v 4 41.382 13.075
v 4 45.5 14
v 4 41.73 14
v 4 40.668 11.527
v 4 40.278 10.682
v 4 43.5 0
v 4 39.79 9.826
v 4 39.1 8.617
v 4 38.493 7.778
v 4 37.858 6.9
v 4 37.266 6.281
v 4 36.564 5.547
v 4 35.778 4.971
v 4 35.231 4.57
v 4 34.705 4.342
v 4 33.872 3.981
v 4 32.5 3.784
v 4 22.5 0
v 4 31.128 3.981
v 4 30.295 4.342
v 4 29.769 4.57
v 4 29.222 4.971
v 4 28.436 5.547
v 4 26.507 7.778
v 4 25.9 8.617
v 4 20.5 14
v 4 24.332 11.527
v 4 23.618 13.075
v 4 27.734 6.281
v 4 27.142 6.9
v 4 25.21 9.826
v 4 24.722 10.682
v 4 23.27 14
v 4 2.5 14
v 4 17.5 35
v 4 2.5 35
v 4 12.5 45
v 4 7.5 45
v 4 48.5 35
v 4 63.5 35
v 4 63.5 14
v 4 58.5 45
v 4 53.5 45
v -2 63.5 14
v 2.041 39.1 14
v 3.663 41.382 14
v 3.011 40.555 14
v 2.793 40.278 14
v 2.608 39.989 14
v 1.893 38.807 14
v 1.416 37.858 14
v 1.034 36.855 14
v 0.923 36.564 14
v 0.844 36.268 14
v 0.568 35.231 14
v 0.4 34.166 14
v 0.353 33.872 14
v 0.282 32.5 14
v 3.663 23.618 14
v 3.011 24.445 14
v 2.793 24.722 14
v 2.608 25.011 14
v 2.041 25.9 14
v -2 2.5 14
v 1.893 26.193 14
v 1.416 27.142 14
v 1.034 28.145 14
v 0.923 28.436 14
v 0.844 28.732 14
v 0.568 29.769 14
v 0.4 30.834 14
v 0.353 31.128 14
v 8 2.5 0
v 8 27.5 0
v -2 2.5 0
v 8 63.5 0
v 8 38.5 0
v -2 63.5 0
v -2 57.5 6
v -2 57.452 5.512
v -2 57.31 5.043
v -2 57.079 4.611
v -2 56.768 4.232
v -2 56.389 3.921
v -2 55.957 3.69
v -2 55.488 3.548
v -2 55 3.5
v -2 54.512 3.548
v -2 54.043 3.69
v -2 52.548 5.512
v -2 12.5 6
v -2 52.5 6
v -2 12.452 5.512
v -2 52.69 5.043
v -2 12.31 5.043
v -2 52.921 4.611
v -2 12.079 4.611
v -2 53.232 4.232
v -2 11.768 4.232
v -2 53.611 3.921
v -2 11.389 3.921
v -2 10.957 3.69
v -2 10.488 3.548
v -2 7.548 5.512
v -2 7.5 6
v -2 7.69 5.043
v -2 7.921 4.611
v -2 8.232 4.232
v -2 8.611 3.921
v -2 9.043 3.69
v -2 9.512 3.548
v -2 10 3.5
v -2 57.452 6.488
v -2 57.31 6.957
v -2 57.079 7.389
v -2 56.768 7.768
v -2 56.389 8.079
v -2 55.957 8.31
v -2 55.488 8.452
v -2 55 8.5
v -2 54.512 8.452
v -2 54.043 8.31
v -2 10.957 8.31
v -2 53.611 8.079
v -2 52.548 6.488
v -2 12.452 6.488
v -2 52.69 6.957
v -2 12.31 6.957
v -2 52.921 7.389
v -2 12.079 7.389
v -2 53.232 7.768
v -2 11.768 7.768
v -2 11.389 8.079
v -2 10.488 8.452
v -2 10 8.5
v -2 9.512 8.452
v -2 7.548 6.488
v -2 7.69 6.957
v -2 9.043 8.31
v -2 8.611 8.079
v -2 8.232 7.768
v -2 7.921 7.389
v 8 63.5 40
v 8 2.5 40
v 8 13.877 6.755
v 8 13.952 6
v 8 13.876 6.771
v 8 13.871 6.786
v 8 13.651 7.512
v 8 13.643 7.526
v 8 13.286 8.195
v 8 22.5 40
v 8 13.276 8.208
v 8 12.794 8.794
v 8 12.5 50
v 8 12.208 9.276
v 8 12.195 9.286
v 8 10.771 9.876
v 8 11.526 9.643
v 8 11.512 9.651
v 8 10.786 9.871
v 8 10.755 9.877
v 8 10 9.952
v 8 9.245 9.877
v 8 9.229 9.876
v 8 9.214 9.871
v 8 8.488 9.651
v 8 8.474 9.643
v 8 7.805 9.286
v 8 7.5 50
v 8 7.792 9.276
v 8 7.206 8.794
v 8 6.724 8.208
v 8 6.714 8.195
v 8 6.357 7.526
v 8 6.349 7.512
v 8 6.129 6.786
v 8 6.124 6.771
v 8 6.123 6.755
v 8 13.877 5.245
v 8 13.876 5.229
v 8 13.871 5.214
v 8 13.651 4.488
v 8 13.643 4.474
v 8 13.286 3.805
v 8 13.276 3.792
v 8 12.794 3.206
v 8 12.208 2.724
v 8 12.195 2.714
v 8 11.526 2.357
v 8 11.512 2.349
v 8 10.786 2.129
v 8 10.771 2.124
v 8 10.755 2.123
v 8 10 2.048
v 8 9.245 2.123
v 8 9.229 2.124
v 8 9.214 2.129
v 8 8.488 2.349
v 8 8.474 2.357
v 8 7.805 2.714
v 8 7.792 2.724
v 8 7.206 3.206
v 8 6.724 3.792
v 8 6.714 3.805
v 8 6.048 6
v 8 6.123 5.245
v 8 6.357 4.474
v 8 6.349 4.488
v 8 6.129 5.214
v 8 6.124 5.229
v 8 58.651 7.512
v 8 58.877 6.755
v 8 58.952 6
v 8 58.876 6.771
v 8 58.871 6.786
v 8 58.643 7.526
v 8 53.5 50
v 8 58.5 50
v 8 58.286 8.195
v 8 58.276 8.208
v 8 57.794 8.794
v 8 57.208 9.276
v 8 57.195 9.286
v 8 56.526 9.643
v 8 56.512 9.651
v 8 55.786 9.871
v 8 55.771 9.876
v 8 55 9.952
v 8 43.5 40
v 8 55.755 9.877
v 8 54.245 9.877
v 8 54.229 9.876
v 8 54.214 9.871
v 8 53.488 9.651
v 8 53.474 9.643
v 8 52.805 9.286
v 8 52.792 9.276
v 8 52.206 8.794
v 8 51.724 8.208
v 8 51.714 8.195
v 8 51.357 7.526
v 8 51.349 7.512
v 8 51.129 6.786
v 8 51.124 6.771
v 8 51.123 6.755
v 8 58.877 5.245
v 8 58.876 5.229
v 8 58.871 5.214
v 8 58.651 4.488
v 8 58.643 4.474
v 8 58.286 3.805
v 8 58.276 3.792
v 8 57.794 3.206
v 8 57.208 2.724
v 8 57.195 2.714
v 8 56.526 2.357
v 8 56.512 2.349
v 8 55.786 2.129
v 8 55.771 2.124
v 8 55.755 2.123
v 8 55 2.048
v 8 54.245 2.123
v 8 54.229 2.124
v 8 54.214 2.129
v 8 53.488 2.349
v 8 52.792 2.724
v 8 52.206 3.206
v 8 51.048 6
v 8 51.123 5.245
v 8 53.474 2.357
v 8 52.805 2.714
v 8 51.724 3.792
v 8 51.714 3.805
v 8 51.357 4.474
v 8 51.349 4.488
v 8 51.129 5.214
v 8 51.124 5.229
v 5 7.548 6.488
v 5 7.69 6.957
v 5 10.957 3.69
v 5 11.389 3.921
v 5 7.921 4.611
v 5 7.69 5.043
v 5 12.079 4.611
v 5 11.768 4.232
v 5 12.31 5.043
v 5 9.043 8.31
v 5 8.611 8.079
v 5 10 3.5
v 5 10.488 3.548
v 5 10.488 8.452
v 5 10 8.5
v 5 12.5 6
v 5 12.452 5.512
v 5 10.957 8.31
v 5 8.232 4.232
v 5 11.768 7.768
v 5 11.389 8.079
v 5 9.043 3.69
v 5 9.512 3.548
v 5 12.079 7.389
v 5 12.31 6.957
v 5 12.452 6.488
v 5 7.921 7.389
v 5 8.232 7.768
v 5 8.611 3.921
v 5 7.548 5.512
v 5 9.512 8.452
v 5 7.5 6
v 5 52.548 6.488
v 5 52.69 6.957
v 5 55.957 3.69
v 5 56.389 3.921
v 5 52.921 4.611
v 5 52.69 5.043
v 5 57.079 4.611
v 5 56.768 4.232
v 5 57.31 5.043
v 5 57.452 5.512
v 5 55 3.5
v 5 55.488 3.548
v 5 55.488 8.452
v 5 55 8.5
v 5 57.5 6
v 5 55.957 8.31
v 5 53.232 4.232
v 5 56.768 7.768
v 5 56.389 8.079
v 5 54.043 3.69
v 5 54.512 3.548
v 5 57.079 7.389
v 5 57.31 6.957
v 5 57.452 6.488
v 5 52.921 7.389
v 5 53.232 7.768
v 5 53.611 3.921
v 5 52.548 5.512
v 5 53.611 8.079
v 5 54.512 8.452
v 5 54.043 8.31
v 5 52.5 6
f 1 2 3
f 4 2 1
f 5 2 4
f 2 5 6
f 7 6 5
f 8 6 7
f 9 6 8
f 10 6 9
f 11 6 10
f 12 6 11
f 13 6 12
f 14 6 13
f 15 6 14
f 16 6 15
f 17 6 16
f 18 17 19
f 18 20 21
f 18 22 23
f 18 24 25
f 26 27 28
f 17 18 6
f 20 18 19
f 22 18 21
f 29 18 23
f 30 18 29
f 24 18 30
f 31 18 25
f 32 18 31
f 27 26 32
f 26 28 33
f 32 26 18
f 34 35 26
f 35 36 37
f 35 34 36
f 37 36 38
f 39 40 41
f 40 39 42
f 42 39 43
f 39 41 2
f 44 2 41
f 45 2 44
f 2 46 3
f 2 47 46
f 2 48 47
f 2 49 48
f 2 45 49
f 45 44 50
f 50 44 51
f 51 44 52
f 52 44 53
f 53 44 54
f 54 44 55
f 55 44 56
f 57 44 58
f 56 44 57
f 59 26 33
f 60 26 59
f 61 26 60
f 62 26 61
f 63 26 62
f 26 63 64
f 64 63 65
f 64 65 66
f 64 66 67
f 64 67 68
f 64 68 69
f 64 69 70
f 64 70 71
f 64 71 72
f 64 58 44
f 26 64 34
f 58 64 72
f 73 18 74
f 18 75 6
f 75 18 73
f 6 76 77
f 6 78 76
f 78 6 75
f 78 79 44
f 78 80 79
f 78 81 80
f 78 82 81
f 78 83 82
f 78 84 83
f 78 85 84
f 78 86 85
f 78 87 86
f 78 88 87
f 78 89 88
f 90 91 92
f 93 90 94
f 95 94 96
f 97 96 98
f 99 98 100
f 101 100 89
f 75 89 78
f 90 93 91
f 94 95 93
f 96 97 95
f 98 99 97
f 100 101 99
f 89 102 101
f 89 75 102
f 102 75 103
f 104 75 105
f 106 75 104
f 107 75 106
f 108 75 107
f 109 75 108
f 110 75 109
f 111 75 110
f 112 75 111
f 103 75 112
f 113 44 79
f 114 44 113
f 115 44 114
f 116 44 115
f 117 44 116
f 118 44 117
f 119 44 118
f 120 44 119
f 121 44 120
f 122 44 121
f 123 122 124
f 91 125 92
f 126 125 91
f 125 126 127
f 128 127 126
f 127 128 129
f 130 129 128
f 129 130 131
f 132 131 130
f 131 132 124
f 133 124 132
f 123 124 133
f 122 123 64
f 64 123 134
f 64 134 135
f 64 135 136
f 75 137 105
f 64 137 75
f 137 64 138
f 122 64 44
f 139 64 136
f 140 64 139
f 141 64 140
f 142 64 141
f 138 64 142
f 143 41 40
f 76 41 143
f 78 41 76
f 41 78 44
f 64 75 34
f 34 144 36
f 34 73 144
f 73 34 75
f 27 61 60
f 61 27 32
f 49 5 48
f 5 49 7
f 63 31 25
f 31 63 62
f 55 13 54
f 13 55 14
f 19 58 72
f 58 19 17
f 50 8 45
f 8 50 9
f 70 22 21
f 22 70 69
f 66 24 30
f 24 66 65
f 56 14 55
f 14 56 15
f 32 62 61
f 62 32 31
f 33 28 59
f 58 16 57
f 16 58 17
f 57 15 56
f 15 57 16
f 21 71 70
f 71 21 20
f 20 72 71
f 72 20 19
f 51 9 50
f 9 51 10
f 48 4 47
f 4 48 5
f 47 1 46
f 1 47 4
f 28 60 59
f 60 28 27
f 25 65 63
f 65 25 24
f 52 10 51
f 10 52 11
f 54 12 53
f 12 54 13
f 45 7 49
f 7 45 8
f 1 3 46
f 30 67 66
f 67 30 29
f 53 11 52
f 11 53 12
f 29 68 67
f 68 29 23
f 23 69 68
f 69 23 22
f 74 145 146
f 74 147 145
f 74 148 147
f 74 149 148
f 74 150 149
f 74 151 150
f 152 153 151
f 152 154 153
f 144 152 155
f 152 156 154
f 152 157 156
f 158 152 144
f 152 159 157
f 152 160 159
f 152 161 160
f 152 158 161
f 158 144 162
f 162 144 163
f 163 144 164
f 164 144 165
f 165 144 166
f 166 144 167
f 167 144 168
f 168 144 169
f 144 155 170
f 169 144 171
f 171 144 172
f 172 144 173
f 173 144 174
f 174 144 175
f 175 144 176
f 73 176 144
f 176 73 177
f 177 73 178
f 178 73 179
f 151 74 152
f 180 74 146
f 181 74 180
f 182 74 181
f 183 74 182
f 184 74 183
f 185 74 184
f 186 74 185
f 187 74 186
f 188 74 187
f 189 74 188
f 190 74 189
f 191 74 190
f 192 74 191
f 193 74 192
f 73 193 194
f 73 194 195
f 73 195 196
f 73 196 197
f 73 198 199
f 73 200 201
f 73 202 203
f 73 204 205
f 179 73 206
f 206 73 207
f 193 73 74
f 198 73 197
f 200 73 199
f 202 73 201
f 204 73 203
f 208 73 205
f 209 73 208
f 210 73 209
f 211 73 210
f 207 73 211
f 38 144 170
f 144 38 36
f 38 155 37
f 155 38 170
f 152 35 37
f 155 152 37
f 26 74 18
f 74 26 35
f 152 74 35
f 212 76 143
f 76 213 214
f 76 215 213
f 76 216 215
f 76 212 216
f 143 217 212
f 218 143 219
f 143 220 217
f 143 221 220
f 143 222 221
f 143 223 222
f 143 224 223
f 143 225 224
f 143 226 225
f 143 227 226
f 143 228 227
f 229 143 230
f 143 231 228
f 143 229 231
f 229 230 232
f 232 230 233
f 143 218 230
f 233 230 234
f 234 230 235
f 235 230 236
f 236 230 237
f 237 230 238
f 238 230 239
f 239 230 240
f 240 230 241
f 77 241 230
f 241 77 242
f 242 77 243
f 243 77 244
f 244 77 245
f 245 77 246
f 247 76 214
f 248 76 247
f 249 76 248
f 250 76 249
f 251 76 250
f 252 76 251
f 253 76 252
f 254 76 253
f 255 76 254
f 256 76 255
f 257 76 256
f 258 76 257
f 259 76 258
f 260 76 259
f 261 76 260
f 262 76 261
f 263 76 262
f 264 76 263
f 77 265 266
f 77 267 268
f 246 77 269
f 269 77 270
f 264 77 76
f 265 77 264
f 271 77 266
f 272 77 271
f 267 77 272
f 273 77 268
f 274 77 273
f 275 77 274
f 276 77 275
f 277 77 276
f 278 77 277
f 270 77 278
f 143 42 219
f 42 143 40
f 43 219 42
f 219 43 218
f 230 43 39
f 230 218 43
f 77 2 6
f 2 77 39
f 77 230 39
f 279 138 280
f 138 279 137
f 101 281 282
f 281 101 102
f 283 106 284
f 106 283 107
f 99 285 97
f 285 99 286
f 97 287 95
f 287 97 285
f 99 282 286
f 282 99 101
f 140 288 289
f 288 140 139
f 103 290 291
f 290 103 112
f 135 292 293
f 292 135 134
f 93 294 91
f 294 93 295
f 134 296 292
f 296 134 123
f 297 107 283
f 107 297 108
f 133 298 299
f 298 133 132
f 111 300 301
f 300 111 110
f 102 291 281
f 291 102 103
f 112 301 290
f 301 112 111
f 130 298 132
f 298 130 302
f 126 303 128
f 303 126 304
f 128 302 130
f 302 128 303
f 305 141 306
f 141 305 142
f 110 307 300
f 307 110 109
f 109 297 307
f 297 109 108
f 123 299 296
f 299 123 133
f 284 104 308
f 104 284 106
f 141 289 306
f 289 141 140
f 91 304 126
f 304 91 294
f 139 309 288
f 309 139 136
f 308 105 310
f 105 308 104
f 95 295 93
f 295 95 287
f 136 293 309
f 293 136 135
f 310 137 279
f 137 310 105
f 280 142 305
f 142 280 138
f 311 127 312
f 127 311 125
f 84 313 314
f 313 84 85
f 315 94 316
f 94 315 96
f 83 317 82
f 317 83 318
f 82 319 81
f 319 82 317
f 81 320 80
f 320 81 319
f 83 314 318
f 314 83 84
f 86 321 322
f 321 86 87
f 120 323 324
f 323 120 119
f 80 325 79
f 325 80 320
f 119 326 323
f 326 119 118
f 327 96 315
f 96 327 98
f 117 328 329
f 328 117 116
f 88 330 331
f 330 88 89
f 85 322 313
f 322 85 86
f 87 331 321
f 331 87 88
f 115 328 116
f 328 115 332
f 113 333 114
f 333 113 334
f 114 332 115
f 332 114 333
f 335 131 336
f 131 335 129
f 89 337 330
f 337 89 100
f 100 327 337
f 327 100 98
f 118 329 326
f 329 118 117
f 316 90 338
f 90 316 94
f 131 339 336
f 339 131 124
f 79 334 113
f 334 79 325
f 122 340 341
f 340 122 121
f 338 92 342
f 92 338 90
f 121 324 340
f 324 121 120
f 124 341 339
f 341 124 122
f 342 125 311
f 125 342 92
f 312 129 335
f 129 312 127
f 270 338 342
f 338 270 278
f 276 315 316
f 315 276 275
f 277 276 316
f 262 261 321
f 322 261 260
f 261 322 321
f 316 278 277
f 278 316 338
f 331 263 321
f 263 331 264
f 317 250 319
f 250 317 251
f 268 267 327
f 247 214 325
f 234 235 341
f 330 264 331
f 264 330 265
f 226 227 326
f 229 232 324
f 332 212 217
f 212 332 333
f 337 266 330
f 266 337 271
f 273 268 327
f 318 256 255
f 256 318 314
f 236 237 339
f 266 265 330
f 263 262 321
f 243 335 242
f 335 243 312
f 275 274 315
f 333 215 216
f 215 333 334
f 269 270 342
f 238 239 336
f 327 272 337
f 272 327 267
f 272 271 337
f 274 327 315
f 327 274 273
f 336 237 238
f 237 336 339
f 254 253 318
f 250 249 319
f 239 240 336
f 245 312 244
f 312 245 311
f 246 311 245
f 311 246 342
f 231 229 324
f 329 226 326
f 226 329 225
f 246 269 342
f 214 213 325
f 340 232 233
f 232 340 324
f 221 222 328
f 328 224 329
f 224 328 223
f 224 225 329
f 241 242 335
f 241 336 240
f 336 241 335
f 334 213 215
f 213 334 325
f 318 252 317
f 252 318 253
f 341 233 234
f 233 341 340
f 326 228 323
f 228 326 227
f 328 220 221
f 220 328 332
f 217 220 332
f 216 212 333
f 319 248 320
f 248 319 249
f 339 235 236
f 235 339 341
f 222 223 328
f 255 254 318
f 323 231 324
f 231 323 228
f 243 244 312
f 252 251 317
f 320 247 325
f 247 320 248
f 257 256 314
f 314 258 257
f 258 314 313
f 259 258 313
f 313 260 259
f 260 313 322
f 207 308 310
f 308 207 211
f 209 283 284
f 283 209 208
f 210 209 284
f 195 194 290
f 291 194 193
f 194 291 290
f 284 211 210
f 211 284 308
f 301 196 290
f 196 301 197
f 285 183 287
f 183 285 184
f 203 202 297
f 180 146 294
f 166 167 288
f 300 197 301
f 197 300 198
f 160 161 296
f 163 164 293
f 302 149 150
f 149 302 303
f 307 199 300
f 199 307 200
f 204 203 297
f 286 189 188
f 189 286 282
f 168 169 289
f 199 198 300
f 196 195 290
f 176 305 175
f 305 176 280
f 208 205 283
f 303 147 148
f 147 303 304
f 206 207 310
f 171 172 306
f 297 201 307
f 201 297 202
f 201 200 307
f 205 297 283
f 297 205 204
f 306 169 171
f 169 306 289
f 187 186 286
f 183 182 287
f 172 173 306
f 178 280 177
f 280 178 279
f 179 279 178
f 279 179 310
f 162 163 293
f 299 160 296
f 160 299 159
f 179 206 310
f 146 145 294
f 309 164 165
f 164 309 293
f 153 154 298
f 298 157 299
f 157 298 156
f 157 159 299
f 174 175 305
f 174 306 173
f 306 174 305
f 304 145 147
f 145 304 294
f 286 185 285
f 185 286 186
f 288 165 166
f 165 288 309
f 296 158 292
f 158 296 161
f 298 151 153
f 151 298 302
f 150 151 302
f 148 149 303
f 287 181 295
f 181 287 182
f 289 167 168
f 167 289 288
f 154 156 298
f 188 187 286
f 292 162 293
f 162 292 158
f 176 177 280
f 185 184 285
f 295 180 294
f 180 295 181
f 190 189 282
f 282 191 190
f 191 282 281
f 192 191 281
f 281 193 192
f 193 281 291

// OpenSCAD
module Peg() {
polyhedron([[0, -5, 0],  [4, -5, 0],  [0, 15, 0],  [4, 20, 0],
    
            [4, -5, 40], [4, 0, 50], [4, 5, 50], [4, 15, 40],
            [0, -5, 35], [0, 0, 45], [0, 5, 45], [0, 10, 35]],
    
            [[0,  1,  3,  2],[1,  4,  5,  6,  7,  3],[0, 2, 11, 10,  9,  8],
            [1,  0,  8,  4], [4,  8,  9,  5], [5,  9, 10,  6], [6, 10, 11,  7],
            [2,  3,  7, 11],], 10);
}

//MountStrut(0, -10);
//MountStrut(45, -10);

difference() {
    union() {
        difference(){
translate([-2, 2.5, 0])
    cube([6, 61, 14]);
translate([17, 32.5, 9])
    rotate([0, -20, 00])
            translate([0, 0, -10])
        cylinder(h=26, d=28, $fn=64);
        }

translate([4, 7.5, 0])
    Peg();
    
translate([4, 58.5, 0])
    mirror([0, 1, 0])
    Peg();
}

translate([-6, 10, 6])
    rotate([0, 90, 00])
        cylinder(h=20, d=5, $fn=32);

translate([-6, 55, 6])
    rotate([0, 90, 00])
        cylinder(h=20, d=5, $fn=32);

translate([5, 55, 6])
    rotate([0, 90, 0])
    cylinder(h=3.1, d1 = 5, d2 = 8, $fn = 32);

translate([5, 10, 6])
    rotate([0, 90, 0])
    cylinder(h=3.1, d1 = 5, d2 = 8, $fn = 32);
}
